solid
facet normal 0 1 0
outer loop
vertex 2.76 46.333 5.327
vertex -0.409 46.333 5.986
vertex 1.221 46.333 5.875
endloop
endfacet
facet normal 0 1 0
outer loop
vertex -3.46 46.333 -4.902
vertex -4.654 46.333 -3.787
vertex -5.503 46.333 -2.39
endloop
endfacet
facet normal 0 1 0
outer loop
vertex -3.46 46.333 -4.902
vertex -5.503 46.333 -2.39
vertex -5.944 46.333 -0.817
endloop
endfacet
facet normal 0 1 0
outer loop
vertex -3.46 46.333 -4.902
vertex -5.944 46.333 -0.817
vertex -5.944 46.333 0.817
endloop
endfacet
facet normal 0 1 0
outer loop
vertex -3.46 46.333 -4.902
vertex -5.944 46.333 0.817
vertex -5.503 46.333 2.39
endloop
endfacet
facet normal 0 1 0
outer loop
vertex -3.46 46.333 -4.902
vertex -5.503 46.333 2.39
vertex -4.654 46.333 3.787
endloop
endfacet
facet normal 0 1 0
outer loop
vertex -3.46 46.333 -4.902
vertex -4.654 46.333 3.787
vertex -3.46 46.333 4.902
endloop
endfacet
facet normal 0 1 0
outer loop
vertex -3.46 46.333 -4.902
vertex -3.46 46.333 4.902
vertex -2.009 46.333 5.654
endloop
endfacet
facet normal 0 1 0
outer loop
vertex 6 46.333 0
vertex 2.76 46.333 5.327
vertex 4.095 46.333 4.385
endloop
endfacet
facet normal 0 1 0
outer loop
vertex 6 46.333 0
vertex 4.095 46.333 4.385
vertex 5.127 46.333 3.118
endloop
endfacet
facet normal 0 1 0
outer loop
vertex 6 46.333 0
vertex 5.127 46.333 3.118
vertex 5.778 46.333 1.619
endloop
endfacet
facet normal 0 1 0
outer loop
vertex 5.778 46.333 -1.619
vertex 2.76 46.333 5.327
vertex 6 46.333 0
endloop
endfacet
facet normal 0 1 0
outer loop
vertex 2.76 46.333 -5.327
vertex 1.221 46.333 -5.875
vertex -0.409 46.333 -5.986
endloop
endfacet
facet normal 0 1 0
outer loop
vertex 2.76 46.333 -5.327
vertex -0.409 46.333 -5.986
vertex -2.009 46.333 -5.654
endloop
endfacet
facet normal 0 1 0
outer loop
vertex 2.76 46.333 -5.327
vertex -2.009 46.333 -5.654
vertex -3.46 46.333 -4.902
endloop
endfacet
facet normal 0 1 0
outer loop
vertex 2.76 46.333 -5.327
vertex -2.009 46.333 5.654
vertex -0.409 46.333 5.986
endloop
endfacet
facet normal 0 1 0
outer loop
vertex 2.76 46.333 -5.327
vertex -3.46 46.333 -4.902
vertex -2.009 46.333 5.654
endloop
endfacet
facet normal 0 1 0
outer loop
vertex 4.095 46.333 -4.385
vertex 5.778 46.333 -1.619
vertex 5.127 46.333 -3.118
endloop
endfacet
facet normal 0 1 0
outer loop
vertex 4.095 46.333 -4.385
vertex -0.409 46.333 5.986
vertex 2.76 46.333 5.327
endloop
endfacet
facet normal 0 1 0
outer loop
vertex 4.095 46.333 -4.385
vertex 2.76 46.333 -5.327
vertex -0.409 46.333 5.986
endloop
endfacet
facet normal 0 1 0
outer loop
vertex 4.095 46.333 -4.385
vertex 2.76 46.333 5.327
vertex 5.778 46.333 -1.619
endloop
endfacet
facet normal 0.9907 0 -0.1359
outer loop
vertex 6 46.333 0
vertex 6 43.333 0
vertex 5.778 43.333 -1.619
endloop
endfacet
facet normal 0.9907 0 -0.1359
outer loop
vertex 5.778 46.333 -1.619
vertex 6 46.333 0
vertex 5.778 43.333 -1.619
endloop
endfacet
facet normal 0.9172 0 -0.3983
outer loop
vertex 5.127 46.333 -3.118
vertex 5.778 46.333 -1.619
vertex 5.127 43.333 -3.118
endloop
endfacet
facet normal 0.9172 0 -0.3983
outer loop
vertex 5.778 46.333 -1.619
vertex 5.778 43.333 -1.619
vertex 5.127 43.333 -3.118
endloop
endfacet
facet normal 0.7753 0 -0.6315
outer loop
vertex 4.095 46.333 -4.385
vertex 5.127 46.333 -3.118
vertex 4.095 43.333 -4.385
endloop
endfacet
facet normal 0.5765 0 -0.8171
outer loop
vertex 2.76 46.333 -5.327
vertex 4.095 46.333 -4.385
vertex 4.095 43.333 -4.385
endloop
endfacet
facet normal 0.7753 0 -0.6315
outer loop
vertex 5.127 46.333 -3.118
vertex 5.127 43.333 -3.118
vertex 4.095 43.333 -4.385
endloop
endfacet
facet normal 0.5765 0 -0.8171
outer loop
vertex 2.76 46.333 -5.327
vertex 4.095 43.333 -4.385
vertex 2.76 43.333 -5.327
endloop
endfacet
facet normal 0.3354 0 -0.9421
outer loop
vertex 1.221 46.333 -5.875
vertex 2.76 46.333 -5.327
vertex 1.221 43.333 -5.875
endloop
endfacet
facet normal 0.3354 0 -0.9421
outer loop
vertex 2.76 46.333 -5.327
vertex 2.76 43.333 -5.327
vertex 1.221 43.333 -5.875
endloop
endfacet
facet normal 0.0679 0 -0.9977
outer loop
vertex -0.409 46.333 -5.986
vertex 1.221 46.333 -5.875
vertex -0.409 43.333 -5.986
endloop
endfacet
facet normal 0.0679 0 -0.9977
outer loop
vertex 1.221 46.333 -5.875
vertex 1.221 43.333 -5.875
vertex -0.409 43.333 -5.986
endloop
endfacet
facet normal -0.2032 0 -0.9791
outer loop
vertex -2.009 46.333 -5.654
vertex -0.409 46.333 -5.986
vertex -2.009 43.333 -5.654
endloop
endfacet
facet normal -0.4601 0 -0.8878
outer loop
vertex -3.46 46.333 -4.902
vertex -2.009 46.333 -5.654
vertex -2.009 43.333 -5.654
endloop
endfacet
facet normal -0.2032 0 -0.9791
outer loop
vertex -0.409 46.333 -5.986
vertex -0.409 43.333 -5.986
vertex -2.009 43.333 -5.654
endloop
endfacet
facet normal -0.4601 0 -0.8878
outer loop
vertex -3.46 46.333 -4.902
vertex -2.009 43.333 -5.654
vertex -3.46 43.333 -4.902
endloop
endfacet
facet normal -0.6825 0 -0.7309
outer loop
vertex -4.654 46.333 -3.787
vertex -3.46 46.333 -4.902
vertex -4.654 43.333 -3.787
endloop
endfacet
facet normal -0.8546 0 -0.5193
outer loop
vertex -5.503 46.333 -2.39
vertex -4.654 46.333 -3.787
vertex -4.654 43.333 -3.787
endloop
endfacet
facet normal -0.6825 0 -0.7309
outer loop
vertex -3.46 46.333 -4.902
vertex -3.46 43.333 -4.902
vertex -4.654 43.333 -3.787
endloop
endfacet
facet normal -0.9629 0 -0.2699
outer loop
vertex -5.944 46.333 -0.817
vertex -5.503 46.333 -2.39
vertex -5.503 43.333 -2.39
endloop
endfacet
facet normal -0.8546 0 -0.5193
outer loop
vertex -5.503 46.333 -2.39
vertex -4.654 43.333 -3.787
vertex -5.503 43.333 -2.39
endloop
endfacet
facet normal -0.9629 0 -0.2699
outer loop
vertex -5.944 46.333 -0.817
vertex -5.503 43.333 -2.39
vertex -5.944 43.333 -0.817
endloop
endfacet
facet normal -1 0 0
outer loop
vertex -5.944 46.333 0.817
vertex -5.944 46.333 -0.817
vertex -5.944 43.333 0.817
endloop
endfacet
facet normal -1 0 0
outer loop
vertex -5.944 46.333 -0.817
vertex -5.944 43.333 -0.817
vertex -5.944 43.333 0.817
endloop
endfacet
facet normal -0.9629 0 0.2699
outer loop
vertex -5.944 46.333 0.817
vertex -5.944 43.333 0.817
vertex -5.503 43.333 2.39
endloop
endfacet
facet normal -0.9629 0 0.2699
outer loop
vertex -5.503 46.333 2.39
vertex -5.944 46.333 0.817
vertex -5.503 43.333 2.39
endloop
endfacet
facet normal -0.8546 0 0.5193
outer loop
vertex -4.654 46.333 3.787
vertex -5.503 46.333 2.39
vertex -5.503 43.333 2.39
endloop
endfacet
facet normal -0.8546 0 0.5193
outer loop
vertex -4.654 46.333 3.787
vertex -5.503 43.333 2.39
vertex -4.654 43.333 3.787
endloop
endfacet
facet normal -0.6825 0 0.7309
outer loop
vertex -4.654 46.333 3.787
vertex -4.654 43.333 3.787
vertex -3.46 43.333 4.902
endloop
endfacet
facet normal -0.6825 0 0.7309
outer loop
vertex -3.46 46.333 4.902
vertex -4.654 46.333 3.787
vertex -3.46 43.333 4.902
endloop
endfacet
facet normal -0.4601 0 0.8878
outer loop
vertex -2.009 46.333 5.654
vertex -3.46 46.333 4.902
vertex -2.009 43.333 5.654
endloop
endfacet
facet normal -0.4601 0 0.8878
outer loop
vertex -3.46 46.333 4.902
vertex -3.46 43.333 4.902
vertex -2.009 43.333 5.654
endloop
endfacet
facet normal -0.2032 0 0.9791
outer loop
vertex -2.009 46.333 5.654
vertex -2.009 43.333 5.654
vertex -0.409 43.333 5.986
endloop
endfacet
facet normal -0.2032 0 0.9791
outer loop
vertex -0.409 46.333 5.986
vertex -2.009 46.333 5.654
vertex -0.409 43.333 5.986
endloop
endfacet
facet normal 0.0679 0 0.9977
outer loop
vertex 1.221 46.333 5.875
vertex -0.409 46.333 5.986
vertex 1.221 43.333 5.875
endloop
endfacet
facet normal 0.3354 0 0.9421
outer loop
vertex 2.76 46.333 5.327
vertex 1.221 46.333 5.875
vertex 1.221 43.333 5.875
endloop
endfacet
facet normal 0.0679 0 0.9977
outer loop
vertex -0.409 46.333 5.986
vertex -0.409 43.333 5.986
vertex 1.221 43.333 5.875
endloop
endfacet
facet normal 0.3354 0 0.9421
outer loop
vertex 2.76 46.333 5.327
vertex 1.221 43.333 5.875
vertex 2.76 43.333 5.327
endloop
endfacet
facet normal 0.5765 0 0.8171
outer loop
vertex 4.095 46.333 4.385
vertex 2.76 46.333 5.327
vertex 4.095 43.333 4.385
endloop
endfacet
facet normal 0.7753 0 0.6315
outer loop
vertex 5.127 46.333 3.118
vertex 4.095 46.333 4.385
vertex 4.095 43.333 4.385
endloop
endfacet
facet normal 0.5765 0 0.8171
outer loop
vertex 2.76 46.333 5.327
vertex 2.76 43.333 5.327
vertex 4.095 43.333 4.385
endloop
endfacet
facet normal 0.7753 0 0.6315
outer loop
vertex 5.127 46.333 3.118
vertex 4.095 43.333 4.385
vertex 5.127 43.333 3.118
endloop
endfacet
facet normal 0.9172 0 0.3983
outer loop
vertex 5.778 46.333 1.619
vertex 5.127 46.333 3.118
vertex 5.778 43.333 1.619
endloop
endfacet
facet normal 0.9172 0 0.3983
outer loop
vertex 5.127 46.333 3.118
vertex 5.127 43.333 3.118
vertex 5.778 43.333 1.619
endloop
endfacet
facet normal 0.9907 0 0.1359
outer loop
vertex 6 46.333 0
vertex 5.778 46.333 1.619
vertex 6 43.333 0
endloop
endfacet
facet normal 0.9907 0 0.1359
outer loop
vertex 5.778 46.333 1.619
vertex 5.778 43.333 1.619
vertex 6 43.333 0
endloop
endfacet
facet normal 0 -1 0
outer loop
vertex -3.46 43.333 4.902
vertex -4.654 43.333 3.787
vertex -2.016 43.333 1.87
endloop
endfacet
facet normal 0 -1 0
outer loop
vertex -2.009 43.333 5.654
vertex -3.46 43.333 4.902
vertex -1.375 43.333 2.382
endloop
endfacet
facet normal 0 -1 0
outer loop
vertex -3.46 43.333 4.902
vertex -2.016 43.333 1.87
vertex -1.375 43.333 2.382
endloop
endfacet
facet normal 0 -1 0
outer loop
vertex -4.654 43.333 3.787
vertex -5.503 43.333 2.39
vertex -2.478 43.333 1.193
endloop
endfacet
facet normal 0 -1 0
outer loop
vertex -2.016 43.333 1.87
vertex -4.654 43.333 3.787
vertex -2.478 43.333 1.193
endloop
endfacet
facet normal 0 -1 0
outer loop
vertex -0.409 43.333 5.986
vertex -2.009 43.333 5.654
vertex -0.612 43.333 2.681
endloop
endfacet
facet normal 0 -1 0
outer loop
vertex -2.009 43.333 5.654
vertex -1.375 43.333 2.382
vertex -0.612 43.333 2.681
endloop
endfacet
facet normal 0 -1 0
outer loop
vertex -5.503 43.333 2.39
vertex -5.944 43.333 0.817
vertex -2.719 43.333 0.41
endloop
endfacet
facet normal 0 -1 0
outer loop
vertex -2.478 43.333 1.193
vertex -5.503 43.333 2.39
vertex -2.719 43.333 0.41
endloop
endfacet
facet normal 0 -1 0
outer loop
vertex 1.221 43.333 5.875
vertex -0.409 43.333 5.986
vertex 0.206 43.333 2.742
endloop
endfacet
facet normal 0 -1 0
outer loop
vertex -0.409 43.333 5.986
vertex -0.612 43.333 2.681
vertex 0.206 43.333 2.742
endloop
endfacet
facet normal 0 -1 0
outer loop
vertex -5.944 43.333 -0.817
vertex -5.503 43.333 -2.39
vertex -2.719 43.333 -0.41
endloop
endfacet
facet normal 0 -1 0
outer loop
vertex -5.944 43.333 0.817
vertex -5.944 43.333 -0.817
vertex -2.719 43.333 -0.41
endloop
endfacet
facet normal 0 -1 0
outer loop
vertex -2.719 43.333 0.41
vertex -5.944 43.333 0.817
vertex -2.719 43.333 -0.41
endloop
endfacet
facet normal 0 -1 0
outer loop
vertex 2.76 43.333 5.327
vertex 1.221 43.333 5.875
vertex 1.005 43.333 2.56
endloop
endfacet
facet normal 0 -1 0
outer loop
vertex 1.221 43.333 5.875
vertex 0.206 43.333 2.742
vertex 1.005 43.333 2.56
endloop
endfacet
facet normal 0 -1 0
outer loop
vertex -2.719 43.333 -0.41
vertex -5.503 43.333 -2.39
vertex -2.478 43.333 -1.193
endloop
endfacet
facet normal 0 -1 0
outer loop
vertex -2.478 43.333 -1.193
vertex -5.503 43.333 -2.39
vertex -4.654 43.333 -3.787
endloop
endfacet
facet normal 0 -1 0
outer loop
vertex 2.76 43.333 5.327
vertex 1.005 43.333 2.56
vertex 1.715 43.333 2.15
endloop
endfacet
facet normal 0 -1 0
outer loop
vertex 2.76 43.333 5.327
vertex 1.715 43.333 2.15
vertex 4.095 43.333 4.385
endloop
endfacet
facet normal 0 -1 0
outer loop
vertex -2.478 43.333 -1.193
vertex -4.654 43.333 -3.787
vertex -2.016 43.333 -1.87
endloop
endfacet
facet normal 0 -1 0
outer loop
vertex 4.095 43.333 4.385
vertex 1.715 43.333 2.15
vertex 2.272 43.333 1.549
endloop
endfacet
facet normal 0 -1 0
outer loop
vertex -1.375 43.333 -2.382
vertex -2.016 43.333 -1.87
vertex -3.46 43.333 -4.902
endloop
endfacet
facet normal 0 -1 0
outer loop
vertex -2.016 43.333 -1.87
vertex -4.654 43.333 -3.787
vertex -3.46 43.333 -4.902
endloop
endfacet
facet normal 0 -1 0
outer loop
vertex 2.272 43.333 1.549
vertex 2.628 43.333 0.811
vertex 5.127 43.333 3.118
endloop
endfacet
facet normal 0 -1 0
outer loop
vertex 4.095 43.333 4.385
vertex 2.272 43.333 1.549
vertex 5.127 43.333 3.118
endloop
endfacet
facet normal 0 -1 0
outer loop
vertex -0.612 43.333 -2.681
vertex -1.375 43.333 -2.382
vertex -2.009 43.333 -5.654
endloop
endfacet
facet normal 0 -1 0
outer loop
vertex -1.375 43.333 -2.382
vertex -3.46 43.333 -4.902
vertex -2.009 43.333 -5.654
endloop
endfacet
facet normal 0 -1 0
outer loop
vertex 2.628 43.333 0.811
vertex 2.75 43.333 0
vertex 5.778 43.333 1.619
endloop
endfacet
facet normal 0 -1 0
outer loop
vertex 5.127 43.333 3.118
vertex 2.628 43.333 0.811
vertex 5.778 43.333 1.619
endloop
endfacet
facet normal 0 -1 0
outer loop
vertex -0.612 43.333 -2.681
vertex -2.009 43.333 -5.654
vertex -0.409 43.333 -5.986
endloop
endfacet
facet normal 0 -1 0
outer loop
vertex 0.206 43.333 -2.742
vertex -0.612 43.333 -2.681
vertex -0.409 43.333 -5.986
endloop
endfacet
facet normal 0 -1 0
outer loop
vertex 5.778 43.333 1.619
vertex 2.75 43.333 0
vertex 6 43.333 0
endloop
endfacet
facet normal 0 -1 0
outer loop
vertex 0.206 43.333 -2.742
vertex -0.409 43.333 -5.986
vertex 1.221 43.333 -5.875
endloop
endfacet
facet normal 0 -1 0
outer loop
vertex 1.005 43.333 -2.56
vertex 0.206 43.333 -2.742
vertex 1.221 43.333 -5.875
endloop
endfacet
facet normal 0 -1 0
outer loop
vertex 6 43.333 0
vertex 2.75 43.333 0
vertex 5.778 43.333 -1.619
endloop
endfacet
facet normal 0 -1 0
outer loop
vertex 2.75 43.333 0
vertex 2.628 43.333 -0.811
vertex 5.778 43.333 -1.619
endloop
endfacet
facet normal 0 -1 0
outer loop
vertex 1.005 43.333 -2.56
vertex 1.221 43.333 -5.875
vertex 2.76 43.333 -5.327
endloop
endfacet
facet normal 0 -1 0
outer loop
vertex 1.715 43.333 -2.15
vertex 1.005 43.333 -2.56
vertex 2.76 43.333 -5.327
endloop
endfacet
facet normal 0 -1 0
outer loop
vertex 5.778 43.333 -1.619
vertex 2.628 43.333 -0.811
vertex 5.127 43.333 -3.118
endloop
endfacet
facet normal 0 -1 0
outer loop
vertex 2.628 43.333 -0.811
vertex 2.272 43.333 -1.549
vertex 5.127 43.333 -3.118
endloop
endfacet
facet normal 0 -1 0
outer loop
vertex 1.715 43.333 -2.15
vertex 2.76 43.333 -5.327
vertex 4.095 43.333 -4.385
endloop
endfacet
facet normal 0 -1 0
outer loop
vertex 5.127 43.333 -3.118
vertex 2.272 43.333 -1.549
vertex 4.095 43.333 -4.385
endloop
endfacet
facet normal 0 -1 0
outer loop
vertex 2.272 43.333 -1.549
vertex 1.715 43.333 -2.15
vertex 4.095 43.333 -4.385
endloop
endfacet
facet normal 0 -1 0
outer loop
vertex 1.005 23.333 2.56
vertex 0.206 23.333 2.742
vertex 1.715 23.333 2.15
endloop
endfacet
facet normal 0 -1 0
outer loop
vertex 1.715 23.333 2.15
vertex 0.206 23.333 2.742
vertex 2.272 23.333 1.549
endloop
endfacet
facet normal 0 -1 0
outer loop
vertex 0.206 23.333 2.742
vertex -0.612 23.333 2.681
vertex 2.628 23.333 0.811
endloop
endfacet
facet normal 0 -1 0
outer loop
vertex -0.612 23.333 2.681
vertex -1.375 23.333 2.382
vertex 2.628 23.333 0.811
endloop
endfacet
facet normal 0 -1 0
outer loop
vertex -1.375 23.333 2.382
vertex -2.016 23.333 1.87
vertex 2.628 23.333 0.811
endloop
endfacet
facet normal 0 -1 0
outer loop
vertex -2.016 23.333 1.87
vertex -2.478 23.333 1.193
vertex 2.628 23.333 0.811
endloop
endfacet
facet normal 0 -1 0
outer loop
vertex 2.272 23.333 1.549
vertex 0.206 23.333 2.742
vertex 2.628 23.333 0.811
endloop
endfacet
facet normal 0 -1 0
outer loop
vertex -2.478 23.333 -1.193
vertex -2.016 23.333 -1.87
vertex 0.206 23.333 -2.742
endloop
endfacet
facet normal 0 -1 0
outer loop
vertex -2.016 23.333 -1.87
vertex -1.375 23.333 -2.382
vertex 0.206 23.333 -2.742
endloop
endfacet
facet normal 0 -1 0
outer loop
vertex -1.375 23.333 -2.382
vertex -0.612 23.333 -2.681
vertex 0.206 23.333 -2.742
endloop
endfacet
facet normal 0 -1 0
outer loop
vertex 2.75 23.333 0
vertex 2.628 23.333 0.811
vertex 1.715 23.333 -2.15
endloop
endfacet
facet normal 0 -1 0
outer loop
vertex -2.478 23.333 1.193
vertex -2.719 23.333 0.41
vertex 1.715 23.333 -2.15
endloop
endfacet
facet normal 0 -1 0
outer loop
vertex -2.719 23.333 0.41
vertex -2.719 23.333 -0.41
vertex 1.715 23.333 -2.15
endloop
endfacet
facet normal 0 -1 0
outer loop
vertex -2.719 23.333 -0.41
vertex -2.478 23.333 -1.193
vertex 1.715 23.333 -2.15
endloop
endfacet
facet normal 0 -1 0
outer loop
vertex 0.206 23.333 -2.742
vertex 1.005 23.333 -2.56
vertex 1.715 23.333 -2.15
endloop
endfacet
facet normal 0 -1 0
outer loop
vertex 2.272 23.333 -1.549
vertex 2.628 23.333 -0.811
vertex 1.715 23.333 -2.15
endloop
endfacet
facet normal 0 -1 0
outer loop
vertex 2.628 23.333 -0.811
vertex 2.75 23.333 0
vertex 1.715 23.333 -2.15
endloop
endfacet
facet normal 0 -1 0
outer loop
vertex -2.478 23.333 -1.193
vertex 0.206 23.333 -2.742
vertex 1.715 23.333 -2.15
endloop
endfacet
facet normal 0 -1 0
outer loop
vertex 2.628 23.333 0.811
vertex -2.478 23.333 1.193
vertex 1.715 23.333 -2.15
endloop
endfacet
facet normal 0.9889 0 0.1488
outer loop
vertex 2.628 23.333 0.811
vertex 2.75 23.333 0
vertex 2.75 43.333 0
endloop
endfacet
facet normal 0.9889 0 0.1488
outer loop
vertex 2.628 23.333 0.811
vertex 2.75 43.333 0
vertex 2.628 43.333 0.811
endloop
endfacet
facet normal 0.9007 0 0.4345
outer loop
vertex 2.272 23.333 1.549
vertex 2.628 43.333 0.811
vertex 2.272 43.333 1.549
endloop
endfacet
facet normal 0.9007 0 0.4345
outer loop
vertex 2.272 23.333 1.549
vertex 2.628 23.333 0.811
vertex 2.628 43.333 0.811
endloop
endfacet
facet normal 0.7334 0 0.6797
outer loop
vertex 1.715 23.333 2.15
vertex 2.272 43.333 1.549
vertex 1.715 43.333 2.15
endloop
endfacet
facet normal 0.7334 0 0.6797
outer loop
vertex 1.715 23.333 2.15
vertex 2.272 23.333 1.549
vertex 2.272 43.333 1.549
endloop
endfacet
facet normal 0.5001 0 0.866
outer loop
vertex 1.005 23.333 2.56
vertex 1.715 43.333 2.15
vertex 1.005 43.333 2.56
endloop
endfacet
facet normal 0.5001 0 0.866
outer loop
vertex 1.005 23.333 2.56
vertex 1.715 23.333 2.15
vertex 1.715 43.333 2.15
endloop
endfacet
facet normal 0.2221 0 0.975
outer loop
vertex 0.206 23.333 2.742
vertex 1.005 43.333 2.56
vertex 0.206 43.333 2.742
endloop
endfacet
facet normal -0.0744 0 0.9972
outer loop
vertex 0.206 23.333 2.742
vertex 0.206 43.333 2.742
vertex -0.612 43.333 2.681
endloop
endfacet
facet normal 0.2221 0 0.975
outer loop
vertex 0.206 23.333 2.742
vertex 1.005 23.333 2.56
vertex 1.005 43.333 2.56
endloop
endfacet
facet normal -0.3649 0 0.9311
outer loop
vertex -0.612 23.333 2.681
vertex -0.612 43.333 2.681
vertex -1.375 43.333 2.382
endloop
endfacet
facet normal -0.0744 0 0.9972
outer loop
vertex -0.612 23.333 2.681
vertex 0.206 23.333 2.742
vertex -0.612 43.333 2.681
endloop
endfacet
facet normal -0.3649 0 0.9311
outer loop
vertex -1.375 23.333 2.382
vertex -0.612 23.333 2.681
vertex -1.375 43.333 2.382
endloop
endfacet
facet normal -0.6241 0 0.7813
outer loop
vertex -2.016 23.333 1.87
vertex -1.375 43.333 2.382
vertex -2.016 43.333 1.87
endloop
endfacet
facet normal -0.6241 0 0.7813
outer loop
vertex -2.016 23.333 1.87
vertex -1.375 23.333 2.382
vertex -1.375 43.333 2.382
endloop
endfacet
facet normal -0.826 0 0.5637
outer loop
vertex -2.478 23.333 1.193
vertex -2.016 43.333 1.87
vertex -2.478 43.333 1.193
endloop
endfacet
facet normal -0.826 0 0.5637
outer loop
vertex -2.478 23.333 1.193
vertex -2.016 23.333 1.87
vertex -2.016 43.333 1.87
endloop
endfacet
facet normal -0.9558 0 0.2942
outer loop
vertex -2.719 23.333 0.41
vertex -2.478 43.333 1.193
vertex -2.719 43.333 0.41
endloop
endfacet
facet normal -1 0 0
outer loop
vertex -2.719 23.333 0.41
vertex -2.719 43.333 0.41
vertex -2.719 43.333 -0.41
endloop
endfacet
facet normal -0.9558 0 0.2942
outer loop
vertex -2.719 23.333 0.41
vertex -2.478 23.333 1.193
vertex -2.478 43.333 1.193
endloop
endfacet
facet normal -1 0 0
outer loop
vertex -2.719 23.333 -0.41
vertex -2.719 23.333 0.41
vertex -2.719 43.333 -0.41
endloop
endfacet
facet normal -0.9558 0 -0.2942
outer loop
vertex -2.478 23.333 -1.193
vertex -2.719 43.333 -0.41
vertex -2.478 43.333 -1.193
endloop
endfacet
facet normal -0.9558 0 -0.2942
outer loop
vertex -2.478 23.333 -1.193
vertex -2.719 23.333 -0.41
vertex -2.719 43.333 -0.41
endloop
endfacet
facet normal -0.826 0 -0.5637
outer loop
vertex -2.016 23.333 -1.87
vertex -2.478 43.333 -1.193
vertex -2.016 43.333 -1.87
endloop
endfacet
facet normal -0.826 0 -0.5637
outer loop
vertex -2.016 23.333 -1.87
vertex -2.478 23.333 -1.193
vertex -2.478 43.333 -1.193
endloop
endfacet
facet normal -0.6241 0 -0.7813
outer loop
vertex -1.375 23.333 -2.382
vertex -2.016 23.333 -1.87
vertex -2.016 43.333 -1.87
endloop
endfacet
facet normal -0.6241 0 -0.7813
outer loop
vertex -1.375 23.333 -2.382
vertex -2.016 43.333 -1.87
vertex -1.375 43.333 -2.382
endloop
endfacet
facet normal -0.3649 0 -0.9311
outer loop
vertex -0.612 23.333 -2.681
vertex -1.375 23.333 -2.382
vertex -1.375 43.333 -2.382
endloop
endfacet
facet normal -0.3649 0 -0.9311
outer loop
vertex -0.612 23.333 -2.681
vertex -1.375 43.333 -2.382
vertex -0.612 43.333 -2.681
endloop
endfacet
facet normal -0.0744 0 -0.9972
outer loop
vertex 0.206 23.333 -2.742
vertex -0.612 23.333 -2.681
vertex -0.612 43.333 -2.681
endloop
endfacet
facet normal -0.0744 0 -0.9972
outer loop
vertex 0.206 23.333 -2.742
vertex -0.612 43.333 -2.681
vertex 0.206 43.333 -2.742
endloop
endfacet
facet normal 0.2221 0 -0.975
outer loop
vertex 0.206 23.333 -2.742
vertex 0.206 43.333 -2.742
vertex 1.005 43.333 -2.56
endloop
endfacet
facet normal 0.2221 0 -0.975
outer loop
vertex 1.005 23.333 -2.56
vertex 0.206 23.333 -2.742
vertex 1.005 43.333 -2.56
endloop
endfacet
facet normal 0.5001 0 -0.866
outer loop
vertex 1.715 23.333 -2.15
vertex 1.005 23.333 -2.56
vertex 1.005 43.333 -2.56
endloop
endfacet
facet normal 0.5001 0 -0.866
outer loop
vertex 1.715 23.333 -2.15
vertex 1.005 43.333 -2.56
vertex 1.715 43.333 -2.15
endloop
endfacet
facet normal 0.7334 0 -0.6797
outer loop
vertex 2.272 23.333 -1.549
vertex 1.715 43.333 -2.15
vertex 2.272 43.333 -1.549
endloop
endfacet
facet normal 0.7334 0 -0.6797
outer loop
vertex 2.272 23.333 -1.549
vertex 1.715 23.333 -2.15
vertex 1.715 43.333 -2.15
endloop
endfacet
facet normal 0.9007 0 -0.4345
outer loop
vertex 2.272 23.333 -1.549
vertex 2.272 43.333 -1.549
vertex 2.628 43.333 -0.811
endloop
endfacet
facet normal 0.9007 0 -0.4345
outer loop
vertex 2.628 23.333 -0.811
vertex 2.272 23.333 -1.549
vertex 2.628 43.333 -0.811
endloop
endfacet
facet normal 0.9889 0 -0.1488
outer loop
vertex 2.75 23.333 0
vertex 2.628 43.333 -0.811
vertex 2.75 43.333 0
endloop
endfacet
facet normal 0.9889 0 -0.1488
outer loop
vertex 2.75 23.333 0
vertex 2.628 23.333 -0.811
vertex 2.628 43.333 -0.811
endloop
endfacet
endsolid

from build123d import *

# Parameters (mm, degrees)
SKETCH1_R           = 10
BOSS_EXTRUDE1_DEPTH = 66.666666667
SCALE_1_SCALE       = 0.3
SKETCH_1_R          = 6
EXTRUDE_1_DEPTH     = 3
SKETCH_2_R          = 3
SKETCH_2_R_2        = 2.75
CUT_EXTRUDE_1_DEPTH = 20


with BuildPart() as part:
    # Sketch1 → Boss-Extrude1 (new body)
    with BuildSketch(Plane(origin=(0, 0, 0), x_dir=(1, 0, 0), z_dir=(0, 1, 0))):
        Circle(SKETCH1_R)
    extrude(amount=BOSS_EXTRUDE1_DEPTH)


with BuildPart() as part_1:
    # 축척1: scaled about (0, 33.333333333, 0)
    add(part.part.scale(SCALE_1_SCALE).moved(Location((0, 23.333333333, 0))))

    # 스케치1 → 보스-돌출1 (add)
    with BuildSketch(Plane(origin=(0, 43.333333333, 0), x_dir=(1, 0, 0), z_dir=(0, 1, 0))):
        Circle(SKETCH_1_R)
    extrude(amount=EXTRUDE_1_DEPTH)

    # 스케치2 → 컷-돌출1 (cut)
    with BuildSketch(Plane.XZ.offset(-23.333333333)):
        Circle(SKETCH_2_R)
        Circle(SKETCH_2_R_2, mode=Mode.SUBTRACT)
    extrude(amount=-CUT_EXTRUDE_1_DEPTH, mode=Mode.SUBTRACT)


solid = part_1.part
